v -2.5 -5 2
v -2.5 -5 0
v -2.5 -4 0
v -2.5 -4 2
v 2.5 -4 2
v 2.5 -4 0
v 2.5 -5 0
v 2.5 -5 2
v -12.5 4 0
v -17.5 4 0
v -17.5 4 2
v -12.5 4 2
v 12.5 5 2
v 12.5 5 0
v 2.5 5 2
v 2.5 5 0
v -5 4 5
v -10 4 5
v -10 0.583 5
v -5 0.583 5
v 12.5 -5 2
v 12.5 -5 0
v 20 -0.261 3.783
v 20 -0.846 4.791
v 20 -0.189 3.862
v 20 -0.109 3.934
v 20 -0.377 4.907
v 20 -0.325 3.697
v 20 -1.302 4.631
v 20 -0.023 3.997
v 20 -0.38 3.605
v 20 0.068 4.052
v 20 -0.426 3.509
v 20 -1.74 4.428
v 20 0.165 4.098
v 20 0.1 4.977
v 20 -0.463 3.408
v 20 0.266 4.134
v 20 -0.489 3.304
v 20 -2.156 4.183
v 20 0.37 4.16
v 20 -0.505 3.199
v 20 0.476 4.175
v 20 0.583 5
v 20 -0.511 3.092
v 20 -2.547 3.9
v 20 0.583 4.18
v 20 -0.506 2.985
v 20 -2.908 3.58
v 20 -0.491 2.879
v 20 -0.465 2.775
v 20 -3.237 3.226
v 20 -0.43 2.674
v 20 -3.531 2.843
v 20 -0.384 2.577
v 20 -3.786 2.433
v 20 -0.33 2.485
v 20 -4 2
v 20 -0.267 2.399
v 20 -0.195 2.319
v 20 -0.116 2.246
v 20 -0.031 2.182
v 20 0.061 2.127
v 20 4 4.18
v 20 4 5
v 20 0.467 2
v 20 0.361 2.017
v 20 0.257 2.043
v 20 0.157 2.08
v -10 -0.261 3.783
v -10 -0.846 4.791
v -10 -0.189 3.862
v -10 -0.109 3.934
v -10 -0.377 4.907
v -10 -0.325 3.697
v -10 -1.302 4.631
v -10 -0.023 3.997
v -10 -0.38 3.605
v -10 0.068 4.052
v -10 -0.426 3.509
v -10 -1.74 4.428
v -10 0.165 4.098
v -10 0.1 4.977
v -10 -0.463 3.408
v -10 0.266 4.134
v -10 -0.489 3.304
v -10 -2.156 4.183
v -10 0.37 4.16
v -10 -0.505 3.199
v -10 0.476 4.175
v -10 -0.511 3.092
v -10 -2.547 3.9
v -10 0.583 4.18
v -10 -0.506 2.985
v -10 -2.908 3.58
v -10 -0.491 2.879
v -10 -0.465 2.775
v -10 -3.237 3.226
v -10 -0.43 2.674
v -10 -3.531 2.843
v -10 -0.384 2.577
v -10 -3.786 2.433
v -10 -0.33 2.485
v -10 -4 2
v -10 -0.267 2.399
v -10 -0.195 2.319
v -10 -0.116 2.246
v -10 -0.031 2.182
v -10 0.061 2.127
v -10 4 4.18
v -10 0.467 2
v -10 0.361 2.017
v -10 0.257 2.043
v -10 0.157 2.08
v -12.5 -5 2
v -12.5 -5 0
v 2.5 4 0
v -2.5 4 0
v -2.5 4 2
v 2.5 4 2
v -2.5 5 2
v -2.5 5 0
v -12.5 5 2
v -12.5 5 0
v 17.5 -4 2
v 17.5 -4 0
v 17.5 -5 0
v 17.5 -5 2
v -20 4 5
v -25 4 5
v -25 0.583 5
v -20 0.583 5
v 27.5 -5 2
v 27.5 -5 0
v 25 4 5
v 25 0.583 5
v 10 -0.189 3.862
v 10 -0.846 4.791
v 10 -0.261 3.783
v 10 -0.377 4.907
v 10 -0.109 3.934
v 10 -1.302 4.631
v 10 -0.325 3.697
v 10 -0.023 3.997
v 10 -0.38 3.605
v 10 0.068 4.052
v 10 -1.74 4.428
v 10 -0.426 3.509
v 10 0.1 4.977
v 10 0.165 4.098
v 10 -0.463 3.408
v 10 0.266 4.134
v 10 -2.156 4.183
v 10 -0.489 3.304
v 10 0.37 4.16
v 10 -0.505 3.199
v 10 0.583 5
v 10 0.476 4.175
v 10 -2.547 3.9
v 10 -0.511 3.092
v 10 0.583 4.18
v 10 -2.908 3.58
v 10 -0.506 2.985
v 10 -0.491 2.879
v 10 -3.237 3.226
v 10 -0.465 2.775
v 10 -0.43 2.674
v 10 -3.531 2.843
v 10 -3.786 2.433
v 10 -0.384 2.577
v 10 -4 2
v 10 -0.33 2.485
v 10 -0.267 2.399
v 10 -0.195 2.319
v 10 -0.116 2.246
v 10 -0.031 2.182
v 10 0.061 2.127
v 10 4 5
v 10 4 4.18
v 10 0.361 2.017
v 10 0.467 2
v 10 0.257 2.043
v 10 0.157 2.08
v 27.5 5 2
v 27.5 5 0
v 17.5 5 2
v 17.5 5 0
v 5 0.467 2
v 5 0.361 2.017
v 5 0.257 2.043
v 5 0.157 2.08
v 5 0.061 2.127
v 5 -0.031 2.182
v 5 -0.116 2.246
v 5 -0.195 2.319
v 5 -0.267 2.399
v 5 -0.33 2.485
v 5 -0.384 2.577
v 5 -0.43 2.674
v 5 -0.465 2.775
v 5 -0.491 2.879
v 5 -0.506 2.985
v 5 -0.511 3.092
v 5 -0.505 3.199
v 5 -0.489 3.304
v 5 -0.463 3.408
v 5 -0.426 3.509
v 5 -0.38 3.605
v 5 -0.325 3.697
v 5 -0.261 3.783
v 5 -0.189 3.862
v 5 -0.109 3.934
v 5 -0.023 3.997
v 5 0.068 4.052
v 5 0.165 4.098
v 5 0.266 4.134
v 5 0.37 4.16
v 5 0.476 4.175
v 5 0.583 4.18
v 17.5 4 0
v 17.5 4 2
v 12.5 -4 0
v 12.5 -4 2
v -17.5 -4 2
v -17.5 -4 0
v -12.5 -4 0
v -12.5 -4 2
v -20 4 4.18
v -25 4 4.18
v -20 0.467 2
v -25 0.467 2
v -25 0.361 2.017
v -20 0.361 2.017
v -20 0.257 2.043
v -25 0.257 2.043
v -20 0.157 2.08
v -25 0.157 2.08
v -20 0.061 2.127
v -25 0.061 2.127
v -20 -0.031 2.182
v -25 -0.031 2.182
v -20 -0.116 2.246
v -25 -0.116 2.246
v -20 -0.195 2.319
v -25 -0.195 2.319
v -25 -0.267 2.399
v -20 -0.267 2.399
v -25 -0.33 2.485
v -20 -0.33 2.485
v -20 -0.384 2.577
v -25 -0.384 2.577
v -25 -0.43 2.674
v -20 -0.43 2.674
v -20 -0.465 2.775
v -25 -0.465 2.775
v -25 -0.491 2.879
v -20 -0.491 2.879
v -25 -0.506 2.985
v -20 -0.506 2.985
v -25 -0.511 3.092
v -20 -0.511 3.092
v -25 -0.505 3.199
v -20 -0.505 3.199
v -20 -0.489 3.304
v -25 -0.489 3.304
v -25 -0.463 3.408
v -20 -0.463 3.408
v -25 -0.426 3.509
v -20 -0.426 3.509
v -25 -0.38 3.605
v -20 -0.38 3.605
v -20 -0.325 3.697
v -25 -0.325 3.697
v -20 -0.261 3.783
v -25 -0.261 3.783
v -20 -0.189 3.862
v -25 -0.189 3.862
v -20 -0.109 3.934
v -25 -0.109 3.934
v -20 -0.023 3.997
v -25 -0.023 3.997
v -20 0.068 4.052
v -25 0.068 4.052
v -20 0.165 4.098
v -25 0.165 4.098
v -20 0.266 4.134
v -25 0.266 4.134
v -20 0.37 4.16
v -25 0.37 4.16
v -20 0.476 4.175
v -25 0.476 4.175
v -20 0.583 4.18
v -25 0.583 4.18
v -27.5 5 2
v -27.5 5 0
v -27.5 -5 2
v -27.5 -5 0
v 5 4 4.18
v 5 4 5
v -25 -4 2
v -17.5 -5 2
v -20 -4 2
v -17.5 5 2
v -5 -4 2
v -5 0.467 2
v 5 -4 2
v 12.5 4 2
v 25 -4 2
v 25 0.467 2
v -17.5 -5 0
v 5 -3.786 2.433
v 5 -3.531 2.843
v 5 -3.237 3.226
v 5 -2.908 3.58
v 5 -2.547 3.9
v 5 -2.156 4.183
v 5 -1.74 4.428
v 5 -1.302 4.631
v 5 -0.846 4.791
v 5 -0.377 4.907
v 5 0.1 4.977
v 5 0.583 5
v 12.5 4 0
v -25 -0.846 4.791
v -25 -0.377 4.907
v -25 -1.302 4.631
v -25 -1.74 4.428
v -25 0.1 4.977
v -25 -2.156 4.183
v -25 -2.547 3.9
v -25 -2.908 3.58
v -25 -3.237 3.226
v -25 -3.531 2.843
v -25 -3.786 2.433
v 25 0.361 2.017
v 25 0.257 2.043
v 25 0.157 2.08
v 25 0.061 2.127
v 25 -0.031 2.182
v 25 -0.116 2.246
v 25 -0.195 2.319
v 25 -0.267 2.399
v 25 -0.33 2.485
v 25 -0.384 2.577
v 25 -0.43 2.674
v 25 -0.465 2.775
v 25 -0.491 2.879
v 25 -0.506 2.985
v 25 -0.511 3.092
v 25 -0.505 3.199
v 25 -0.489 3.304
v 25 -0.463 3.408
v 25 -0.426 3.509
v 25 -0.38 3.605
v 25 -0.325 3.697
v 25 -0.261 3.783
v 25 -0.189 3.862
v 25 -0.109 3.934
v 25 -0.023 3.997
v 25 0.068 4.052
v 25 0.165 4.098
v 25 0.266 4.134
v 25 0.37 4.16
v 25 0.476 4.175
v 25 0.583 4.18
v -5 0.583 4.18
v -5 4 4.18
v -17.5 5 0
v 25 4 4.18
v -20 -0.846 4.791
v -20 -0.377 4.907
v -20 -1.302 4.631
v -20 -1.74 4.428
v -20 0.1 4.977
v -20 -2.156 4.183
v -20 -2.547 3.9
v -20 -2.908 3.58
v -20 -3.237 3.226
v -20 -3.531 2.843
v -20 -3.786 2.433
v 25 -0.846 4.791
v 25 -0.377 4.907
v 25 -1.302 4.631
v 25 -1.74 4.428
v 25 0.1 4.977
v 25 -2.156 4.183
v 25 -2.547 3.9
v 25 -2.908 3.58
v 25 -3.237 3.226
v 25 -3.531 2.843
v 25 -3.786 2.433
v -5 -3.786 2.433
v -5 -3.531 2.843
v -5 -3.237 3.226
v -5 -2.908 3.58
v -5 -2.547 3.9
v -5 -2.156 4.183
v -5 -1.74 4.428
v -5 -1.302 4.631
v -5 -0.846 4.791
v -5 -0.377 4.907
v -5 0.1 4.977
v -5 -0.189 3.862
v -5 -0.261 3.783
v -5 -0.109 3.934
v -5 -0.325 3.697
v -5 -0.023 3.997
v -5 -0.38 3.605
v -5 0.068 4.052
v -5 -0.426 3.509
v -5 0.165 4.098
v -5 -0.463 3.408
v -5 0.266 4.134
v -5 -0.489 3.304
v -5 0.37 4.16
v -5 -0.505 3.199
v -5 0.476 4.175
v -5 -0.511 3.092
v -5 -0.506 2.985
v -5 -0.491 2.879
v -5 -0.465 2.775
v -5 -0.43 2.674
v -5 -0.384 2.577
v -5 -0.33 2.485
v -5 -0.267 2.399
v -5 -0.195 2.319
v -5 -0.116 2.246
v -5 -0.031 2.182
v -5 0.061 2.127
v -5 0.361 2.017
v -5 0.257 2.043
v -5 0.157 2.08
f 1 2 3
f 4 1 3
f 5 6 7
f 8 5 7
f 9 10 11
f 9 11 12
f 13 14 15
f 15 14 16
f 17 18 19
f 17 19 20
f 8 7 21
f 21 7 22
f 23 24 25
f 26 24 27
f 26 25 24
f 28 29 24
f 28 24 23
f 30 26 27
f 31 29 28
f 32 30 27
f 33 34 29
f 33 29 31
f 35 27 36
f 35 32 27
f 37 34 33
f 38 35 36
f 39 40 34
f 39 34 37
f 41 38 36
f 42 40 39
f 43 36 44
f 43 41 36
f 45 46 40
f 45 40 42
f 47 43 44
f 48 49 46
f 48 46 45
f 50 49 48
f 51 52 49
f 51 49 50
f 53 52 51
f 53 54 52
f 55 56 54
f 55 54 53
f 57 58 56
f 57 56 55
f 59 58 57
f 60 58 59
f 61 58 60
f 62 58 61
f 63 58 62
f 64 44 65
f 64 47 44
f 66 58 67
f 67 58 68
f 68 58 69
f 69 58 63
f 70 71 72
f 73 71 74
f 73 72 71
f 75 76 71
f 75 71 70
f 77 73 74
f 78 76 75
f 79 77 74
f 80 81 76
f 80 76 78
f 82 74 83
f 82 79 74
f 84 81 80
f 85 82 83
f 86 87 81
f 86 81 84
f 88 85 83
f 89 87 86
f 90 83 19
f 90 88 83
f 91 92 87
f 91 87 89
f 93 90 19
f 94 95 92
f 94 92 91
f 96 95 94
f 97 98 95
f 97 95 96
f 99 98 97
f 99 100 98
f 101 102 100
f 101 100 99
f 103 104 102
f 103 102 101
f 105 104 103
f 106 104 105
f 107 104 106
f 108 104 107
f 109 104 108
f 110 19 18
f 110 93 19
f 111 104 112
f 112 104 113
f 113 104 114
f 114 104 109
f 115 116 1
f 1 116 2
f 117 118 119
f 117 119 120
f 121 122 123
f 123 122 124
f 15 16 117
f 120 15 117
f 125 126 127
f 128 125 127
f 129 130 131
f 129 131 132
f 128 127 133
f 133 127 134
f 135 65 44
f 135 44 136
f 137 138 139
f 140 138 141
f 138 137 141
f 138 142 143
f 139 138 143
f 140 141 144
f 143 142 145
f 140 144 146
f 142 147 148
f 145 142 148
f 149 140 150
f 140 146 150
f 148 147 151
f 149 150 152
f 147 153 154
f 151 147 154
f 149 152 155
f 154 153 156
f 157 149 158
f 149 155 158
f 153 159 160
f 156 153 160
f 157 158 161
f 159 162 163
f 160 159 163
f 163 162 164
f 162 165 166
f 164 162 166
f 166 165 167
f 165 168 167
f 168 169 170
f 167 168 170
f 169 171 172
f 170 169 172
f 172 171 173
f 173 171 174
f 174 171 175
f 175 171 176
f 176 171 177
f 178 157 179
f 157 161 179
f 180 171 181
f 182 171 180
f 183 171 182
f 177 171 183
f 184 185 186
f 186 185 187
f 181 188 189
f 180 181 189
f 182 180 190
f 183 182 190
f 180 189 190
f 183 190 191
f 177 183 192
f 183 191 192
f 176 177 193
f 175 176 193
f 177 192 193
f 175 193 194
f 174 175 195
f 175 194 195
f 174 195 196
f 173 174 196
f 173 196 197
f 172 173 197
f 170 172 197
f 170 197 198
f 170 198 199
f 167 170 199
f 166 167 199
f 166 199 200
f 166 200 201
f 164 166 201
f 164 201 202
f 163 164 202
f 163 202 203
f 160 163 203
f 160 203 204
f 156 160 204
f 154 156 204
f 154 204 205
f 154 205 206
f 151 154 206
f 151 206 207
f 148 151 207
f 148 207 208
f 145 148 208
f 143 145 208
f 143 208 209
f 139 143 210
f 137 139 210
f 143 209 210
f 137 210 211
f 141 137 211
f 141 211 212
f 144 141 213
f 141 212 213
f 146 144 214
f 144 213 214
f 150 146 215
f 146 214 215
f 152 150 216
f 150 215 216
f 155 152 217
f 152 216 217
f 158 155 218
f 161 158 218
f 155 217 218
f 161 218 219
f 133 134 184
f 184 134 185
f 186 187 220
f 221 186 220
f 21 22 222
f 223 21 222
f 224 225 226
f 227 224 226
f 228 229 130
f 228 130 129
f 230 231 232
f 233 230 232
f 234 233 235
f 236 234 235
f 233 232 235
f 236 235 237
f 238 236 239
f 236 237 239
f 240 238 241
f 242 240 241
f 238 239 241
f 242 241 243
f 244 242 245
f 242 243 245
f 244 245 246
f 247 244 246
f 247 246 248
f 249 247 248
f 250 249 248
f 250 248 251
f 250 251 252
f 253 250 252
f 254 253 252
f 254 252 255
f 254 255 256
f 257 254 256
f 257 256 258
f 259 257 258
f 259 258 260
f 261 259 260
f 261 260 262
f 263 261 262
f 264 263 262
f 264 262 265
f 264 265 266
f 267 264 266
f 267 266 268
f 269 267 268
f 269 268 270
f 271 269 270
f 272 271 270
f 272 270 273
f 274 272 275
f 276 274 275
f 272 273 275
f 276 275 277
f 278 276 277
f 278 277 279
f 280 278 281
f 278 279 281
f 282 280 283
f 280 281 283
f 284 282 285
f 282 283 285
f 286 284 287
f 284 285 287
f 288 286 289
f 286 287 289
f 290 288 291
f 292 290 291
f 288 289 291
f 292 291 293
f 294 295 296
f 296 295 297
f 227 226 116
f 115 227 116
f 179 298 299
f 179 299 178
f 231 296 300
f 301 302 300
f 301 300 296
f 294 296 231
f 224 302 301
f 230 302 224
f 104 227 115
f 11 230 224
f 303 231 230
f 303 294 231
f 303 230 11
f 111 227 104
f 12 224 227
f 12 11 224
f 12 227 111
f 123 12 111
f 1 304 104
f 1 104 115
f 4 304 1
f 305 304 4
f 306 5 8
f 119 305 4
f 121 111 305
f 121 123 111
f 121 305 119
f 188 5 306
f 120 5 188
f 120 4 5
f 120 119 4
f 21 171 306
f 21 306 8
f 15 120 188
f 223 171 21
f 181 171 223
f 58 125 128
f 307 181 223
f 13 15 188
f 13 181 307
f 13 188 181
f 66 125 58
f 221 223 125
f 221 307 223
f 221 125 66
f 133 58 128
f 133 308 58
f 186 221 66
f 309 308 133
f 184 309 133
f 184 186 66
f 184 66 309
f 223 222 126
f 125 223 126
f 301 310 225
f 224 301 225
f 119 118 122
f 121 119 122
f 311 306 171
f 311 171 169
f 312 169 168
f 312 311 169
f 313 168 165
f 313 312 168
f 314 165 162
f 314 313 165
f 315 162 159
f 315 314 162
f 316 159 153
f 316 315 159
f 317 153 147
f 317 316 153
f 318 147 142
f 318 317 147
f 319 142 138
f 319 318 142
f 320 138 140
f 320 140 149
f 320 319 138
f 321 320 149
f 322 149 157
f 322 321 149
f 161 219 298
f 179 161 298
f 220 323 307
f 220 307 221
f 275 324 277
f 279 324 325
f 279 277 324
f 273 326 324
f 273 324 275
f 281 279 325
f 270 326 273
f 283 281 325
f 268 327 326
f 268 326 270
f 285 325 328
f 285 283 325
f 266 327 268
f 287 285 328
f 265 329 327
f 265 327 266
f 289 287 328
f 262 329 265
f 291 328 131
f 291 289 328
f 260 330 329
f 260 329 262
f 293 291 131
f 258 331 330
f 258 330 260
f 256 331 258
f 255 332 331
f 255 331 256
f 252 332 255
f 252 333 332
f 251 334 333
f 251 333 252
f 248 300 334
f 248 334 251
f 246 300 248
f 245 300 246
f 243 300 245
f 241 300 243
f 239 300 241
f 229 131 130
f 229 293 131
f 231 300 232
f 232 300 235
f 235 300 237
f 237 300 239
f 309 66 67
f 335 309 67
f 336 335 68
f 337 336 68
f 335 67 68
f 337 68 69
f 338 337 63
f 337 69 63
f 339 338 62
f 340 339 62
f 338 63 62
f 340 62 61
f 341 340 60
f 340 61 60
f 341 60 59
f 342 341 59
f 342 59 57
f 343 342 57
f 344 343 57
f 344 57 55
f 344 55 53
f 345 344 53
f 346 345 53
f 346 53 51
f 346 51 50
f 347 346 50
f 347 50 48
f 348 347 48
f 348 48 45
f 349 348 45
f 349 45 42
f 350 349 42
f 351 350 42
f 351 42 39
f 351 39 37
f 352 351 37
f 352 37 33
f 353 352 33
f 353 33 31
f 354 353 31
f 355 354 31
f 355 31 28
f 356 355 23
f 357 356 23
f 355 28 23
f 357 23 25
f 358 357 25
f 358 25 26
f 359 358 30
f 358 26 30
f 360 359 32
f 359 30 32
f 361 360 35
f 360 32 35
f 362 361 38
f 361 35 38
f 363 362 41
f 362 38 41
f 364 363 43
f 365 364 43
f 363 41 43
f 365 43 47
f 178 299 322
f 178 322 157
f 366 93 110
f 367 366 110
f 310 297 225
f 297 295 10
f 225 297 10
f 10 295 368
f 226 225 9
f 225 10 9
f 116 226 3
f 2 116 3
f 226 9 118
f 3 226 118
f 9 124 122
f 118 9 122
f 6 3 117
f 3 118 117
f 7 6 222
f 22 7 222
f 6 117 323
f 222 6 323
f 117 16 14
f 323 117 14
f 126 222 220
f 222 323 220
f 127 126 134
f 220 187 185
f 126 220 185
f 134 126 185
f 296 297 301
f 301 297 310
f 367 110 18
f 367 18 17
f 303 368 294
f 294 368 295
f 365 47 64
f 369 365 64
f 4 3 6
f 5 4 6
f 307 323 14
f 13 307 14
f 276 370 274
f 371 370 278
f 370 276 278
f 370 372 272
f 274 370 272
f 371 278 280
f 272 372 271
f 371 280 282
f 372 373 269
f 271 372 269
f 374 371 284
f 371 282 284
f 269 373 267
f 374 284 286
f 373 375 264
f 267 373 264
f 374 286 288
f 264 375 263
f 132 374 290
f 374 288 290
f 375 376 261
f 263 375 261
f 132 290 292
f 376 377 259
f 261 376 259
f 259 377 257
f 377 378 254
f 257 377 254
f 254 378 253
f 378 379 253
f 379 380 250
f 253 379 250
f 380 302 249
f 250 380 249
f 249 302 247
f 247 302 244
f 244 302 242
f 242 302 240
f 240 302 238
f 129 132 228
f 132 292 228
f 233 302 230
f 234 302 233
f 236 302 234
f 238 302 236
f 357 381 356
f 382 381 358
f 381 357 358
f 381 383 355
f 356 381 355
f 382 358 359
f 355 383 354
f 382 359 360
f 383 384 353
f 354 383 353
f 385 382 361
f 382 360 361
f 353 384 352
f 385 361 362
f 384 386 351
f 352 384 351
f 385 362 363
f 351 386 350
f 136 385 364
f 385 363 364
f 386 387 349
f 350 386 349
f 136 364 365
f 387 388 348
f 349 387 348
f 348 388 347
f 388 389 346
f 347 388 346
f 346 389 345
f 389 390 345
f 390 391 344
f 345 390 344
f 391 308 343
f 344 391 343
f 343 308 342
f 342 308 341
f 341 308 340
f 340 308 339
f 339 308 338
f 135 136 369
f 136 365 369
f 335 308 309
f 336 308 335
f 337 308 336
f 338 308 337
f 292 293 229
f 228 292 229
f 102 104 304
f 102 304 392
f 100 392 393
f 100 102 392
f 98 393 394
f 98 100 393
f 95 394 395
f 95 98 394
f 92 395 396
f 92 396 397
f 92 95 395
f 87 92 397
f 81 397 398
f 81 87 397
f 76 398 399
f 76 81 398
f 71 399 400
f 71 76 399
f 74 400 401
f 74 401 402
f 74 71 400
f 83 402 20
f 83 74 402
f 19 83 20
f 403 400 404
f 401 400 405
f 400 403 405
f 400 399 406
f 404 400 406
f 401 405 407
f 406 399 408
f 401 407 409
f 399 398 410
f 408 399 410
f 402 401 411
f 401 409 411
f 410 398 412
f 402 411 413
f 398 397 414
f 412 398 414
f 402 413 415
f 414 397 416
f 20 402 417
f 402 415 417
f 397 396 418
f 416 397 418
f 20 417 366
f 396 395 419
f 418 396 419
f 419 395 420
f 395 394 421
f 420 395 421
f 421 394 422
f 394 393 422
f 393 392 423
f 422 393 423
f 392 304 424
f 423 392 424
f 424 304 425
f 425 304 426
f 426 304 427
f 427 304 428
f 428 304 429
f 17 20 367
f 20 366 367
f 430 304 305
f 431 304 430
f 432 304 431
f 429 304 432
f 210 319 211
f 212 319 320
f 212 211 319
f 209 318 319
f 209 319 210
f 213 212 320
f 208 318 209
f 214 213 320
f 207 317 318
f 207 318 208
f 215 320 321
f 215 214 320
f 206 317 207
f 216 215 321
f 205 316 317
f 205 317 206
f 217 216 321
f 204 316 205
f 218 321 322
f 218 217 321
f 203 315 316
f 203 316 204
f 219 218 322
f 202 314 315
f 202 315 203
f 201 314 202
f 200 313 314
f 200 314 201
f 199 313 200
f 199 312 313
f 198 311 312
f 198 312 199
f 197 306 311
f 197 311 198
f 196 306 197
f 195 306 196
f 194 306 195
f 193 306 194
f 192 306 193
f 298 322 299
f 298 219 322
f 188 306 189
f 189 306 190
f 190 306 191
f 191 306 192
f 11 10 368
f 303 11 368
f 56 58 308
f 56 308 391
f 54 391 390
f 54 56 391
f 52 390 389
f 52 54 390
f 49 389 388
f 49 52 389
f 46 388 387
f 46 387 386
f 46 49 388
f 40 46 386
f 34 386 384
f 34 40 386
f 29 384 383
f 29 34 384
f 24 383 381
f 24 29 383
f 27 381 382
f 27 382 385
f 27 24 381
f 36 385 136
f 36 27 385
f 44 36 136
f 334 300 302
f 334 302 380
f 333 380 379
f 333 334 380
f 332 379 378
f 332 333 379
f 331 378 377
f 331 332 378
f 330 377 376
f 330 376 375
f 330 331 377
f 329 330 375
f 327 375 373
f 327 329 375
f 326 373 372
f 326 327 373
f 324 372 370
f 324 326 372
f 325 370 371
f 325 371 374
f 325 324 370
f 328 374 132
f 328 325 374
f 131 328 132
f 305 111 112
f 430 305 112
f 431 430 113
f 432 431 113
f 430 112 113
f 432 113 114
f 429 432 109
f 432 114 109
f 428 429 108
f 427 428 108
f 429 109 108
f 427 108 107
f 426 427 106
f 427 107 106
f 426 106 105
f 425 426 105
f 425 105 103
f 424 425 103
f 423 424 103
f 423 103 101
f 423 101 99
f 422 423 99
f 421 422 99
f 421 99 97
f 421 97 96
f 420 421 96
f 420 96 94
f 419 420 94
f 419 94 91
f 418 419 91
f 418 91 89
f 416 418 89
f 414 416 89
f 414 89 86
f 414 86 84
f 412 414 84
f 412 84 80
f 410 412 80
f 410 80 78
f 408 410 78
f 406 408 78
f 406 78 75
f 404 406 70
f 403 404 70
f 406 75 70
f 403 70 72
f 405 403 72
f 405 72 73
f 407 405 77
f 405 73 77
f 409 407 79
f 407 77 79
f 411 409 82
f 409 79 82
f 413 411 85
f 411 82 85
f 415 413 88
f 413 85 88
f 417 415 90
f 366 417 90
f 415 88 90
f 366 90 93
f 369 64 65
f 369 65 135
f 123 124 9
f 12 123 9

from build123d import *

# Parameters (mm, degrees)
F0_W        = 5
F0_H        = 8
F1_DEPTH    = 2
F2_DEPTH    = 5
F3_T1_DEPTH = 27.9128784748
F3_T3_DEPTH = 27.9128784748
F3_T5_DEPTH = 27.9128784748
F3_T7_DEPTH = 27.9128784748
F5_DEPTH    = 65


# Not quite as in the source:
# - a fillet or chamfer that OpenCascade refuses, or shapes differently, is made with other operations: its cross-section is extruded or revolved along the edge and cut away or added


with BuildPart() as f1:
    # F0 (on Top) → F1 (new body)
    with BuildSketch(Plane.XY):
        Polygon((-17.5, 5), (-27.5, 5), (-27.5, -5), (-17.5, -5), (-17.5, -4), (-17.5, 4), align=None)
        with Locations((-22.5, 0)):
            Rectangle(F0_W, F0_H, mode=Mode.SUBTRACT)
        with Locations((-15, 0)):
            Rectangle(F0_W, F0_H)
        Polygon((-12.5, 5), (-12.5, 4), (-12.5, -4), (-12.5, -5), (-2.5, -5), (-2.5, -4), (-2.5, 4), (-2.5, 5), align=None)
        with Locations((-7.5, 0)):
            Rectangle(F0_W, F0_H, mode=Mode.SUBTRACT)
        Rectangle(F0_W, F0_H)
        Polygon((2.5, 5), (2.5, 4), (2.5, -4), (2.5, -5), (12.5, -5), (12.5, -4), (12.5, 4), (12.5, 5), align=None)
        with Locations((7.5, 0)):
            Rectangle(F0_W, F0_H, mode=Mode.SUBTRACT)
        with Locations((15, 0)):
            Rectangle(F0_W, F0_H)
        Polygon((17.5, 5), (17.5, 4), (17.5, -4), (17.5, -5), (27.5, -5), (27.5, 5), align=None)
        with Locations((22.5, 0)):
            Rectangle(F0_W, F0_H, mode=Mode.SUBTRACT)
    extrude(amount=F1_DEPTH)

    # F0 (on Top) → F2 (join)
    with BuildSketch(Plane.XY):
        with Locations((-22.5, 0)):
            Rectangle(F0_W, F0_H)
        with Locations((-7.5, 0)):
            Rectangle(F0_W, F0_H)
        with Locations((7.5, 0)):
            Rectangle(F0_W, F0_H)
        with Locations((22.5, 0)):
            Rectangle(F0_W, F0_H)
    extrude(amount=F2_DEPTH)

    # F3: fillet of radius 5 on 4 edges, made by hand

    # F3_s2 → F3_t1 (cut)
    with BuildSketch(Plane.YZ.offset(-36.4564392374)):
        with BuildLine():
            ThreePointArc((-4, 2), (-2.1560370926, 4.1833001327), (0.582575695, 5))
            Line((0.582575695, 5), (0.582575695, 5.1))
            Line((0.582575695, 5.1), (-4, 5.1))
            Line((-4, 5.1), (-4.1, 5))
            ThreePointArc((-4.1, 5), (-4.1, 3.5), (-4.0916515139, 2.04))
            Line((-4.0916515139, 2.04), (-4, 2))
        make_face()
    extrude(amount=F3_T1_DEPTH, mode=Mode.SUBTRACT)

    # F3_s4 → F3_t3 (cut)
    with BuildSketch(Plane.YZ.offset(-21.4564392374)):
        with BuildLine():
            ThreePointArc((-4, 2), (-2.1560370926, 4.1833001327), (0.582575695, 5))
            Line((0.582575695, 5), (0.582575695, 5.1))
            Line((0.582575695, 5.1), (-4, 5.1))
            Line((-4, 5.1), (-4.1, 5))
            ThreePointArc((-4.1, 5), (-4.1, 3.5), (-4.0916515139, 2.04))
            Line((-4.0916515139, 2.04), (-4, 2))
        make_face()
    extrude(amount=F3_T3_DEPTH, mode=Mode.SUBTRACT)

    # F3_s6 → F3_t5 (cut)
    with BuildSketch(Plane.YZ.offset(-6.4564392374)):
        with BuildLine():
            ThreePointArc((-4, 2), (-2.1560370926, 4.1833001327), (0.582575695, 5))
            Line((0.582575695, 5), (0.582575695, 5.1))
            Line((0.582575695, 5.1), (-4, 5.1))
            Line((-4, 5.1), (-4.1, 5))
            ThreePointArc((-4.1, 5), (-4.1, 3.5), (-4.0916515139, 2.04))
            Line((-4.0916515139, 2.04), (-4, 2))
        make_face()
    extrude(amount=F3_T5_DEPTH, mode=Mode.SUBTRACT)

    # F3_s8 → F3_t7 (cut)
    with BuildSketch(Plane.YZ.offset(8.5435607626)):
        with BuildLine():
            ThreePointArc((-4, 2), (-2.1560370926, 4.1833001327), (0.582575695, 5))
            Line((0.582575695, 5), (0.582575695, 5.1))
            Line((0.582575695, 5.1), (-4, 5.1))
            Line((-4, 5.1), (-4.1, 5))
            ThreePointArc((-4.1, 5), (-4.1, 3.5), (-4.0916515139, 2.04))
            Line((-4.0916515139, 2.04), (-4, 2))
        make_face()
    extrude(amount=F3_T7_DEPTH, mode=Mode.SUBTRACT)

    # F4 (on face) → F5 (cut)
    with BuildSketch(Plane(origin=(-25, 0, 0), x_dir=(0, -1, 0), z_dir=(-1, 0, 0))):
        with BuildLine():
            Line((-0.582575695, 4.1804881766), (-4, 4.1804881766))
            Line((-4, 4.1804881766), (-4, 2))
            Line((-4, 2), (-0.4667459871, 2))
            ThreePointArc((-0.4667459871, 2), (0.5092055571, 3.1451641031), (-0.582575695, 4.1804881766))
        make_face()
    extrude(amount=-F5_DEPTH, mode=Mode.SUBTRACT)


solid = f1.part
